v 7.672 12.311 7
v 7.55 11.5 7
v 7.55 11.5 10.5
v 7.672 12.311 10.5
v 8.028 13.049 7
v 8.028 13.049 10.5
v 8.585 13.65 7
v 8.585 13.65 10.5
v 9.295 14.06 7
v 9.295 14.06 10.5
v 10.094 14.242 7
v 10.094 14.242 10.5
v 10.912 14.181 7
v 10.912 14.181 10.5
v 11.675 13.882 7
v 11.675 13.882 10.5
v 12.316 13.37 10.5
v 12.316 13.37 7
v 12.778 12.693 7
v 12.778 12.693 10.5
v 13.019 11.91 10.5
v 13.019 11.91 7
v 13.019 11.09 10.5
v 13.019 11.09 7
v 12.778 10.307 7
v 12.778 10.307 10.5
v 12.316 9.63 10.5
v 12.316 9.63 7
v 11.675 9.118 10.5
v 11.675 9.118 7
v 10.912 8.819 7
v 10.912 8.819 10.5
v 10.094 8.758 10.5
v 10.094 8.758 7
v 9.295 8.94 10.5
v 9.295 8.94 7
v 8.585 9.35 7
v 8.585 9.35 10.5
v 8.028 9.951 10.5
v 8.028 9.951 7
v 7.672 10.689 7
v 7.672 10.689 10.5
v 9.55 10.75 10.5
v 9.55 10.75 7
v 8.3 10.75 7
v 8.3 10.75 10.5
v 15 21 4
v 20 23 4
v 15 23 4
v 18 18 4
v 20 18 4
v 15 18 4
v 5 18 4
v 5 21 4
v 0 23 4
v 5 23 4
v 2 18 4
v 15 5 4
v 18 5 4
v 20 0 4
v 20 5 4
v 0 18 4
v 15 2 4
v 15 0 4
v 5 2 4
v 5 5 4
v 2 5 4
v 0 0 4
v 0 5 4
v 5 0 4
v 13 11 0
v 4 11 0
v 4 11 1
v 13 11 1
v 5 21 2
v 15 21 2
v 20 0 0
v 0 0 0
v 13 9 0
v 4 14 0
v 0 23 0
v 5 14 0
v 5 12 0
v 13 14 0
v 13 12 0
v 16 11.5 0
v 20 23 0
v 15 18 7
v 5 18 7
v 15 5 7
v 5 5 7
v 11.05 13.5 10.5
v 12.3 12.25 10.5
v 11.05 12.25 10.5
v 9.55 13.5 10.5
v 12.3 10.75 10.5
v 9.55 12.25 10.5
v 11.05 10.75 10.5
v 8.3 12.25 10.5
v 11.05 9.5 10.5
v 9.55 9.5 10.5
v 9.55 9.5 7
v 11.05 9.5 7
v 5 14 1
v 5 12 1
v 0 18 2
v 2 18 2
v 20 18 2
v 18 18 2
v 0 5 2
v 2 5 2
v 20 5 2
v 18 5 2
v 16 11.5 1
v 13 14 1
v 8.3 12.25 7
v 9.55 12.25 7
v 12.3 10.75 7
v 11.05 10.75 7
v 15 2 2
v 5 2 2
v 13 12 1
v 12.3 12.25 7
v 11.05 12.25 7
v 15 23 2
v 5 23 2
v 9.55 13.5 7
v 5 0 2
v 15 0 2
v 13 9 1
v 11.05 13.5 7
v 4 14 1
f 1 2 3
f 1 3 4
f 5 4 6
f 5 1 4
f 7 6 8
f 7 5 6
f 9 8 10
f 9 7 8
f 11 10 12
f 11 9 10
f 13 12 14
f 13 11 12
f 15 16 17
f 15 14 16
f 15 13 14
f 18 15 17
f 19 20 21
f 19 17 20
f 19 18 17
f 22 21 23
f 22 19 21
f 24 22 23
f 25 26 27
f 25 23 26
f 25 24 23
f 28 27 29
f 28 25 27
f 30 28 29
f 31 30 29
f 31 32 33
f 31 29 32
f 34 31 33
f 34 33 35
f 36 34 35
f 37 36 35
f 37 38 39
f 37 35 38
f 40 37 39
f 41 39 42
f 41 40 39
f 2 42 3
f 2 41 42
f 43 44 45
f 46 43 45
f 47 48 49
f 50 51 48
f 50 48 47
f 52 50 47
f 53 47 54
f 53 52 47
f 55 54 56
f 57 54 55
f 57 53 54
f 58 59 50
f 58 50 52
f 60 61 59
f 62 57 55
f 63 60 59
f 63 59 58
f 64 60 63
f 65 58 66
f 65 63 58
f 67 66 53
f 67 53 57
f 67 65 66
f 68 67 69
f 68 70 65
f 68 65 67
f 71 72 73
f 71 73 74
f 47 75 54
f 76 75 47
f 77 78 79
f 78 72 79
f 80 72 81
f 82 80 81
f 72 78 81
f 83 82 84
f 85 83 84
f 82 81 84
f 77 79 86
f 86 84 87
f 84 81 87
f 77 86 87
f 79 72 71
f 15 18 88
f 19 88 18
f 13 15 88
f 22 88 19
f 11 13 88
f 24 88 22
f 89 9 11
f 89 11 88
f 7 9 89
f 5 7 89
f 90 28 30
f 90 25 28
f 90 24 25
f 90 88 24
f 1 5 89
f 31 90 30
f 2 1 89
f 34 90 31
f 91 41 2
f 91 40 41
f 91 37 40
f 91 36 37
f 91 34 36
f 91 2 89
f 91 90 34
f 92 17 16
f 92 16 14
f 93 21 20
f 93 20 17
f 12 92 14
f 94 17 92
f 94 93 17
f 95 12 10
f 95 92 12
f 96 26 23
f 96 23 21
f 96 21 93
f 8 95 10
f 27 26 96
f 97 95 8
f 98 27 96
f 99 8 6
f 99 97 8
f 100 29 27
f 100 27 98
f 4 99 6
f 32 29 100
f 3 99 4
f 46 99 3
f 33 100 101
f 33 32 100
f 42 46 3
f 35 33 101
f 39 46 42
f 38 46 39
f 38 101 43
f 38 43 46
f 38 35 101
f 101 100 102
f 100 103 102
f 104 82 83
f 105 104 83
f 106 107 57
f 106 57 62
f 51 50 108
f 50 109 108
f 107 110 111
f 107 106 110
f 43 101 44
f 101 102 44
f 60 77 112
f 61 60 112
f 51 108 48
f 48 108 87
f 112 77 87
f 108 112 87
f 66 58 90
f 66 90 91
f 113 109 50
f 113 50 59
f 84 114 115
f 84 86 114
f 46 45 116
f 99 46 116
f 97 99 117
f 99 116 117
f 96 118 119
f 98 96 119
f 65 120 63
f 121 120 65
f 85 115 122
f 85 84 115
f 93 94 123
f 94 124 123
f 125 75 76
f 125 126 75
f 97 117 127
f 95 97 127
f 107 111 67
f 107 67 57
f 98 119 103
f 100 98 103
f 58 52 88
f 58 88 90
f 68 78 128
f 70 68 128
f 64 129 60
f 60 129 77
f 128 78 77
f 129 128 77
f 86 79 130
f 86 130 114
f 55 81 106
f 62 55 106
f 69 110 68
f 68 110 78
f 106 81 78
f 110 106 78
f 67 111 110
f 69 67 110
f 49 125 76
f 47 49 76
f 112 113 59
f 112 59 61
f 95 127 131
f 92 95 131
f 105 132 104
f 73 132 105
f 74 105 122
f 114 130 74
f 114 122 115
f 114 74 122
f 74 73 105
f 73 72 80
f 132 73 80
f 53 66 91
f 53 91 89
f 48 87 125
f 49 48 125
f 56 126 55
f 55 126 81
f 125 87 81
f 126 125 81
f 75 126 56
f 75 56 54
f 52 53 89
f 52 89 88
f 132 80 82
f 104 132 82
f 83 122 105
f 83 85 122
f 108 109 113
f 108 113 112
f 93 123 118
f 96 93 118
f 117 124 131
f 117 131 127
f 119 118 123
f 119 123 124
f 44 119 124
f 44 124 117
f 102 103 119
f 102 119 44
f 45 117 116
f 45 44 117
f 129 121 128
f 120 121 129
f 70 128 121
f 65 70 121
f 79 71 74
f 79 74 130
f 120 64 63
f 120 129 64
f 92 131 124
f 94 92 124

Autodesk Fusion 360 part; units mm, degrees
sketch "スケッチ1" plane through (0, 0, 0) normal (0, 0, 1) x (1, 0, 0)
  line L0 (0, 0) -> (20, 0)
  line L1 (20, 0) -> (20, 23)
  line L2 (20, 23) -> (0, 23)
  line L3 (0, 23) -> (0, 0)
  dimension "d1" = 20
  dimension "d2" = 23
extrude "押し出し1" add sketch "スケッチ1" along normal blind 2
sketch "スケッチ2" plane through (0, 0, 2) normal (0, 0, 1) x (-1, 0, 0)
  line L0 (0, -23) -> (0, 0)
  line L1 (0, 0) -> (-20, 0)
  line L2 (-20, 0) -> (-20, -23)
  line L3 (-20, -23) -> (0, -23)
  line L4 (0, -23) -> (-5, -23)
  line L5 (-5, -23) -> (-5, -18)
  line L6 (-5, -18) -> (0, -18)
  line L7 (0, -18) -> (0, -23)
  line L8 (-20, -23) -> (-15, -23)
  line L9 (-15, -23) -> (-15, -18)
  line L10 (-15, -18) -> (-20, -18)
  line L11 (-20, -18) -> (-20, -23)
  line L12 (0, 0) -> (-5, 0)
  line L13 (-5, 0) -> (-5, -5)
  line L14 (-5, -5) -> (0, -5)
  line L15 (0, -5) -> (0, 0)
  line L16 (-20, 0) -> (-15, 0)
  line L17 (-15, 0) -> (-15, -5)
  line L18 (-15, -5) -> (-20, -5)
  line L19 (-20, -5) -> (-20, 0)
  line L20 (-2, -21) -> (-18, -21)
  line L21 (-18, -21) -> (-18, -2)
  line L22 (-18, -2) -> (-2, -2)
  line L23 (-2, -2) -> (-2, -21)
  dimension "d5" = 5
  dimension "d6" = 5
  dimension "d7" = 5
  dimension "d8" = 5
  dimension "d9" = 5
  dimension "d10" = 5
  dimension "d11" = 5
  dimension "d12" = 5
extrude "押し出し2" add sketch "スケッチ2" along normal blind 2 contours L0 L3 L4 L5 L6 L7 L20 L23 | L0 L1 L12 L13 L14 L15 L22 L23 | L5 L6 L20 L23 | L5 L6 L9 L10 L13 L14 L17 L18 L20 L21 L22 L23 | L2 L3 L8 L9 L10 L11 L20 L21 | L13 L14 L22 L23 | L9 L10 L20 L21 | L1 L2 L16 L17 L18 L19 L21 L22 | L17 L18 L21 L22
sketch "スケッチ3" plane through (0, 0, 4) normal (0, 0, 1) x (-1, 0, 0)
  line L0 (-18, -18) -> (-20, -18)
  line L1 (-20, -18) -> (-20, -23)
  line L2 (-20, -23) -> (-15, -23)
  line L3 (-15, -23) -> (-15, -21)
  line L4 (-15, -21) -> (-5, -21)
  line L5 (-5, -21) -> (-5, -23)
  line L6 (-5, -23) -> (0, -23)
  line L7 (0, -23) -> (0, -18)
  line L8 (0, -18) -> (-2, -18)
  line L9 (-2, -18) -> (-2, -5)
  line L10 (-2, -5) -> (0, -5)
  line L11 (0, -5) -> (0, 0)
  line L12 (0, 0) -> (-5, 0)
  line L13 (-5, 0) -> (-5, -2)
  line L14 (-5, -2) -> (-15, -2)
  line L15 (-15, -2) -> (-15, 0)
  line L16 (-15, 0) -> (-20, 0)
  line L17 (-20, 0) -> (-20, -5)
  line L18 (-20, -5) -> (-18, -5)
  line L19 (-18, -5) -> (-18, -18)
  line L20 (-5, -18) -> (-15, -18)
  line L21 (-15, -18) -> (-15, -5)
  line L22 (-15, -5) -> (-5, -5)
  line L23 (-5, -5) -> (-5, -18)
extrude "押し出し3" add sketch "スケッチ3" along normal blind 3 contours L20 L21 L22 L23
sketch "スケッチ4" plane through (0, 0, 7) normal (0, 0, 1) x (-1, 0, 0)
  line L0 (-5, -5) -> (-15, -5)
  line L1 (-15, -5) -> (-15, -18)
  line L2 (-15, -18) -> (-5, -18)
  line L3 (-5, -18) -> (-5, -5)
  line L4 (-9.55, -13.5) -> (-11.05, -13.5)
  line L5 (-11.05, -13.5) -> (-11.05, -9.5)
  line L6 (-11.05, -9.5) -> (-9.55, -9.5)
  line L7 (-9.55, -9.5) -> (-9.55, -13.5)
  line L8 (-8.3, -12.25) -> (-12.3, -12.25)
  line L9 (-12.3, -12.25) -> (-12.3, -10.75)
  line L10 (-12.3, -10.75) -> (-8.3, -10.75)
  line L11 (-8.3, -10.75) -> (-8.3, -12.25)
  circle A0 centre (-10.3, -11.5) radius 2.75
  dimension "d17" = 13
  dimension "d18" = 1.5
  dimension "d19" = 4
  dimension "d20" = 4
  dimension "d21" = 1.5
  dimension "d22" = 5.5
extrude "押し出し4" add sketch "スケッチ4" along normal blind 3.5 contours A0
sketch "スケッチ5" plane through (0, 0, 0) normal (0, 0, -1) x (1, 0, 0)
  line L0 (0, 0) -> (0, -23)
  line L1 (0, -23) -> (20, -23)
  line L2 (20, -23) -> (20, 0)
  line L3 (20, 0) -> (0, 0)
  line L4 (4, -12) -> (4, -14)
  line L5 (4, -12) -> (4, -11)
  line L6 (13, -11) -> (13, -12)
  line L7 (5, -12) -> (4, -12)
  line L8 (5, -14) -> (5, -12)
  line L9 (4, -14) -> (5, -14)
  line L10 (4, -11) -> (13, -11)
  line L11 (13, -12) -> (4, -12)
  line L12 (13, -11) -> (13, -9)
  line L13 (13, -9) -> (16, -11.5)
  line L14 (16, -11.5) -> (13, -14)
  line L15 (13, -14) -> (13, -12)
extrude "押し出し5" cut sketch "スケッチ5" against normal blind 1 contours L4 L7 L8 L9 L11 | L5 L6 L7 L10 L11 | L6 L12 L13 L14 L15
